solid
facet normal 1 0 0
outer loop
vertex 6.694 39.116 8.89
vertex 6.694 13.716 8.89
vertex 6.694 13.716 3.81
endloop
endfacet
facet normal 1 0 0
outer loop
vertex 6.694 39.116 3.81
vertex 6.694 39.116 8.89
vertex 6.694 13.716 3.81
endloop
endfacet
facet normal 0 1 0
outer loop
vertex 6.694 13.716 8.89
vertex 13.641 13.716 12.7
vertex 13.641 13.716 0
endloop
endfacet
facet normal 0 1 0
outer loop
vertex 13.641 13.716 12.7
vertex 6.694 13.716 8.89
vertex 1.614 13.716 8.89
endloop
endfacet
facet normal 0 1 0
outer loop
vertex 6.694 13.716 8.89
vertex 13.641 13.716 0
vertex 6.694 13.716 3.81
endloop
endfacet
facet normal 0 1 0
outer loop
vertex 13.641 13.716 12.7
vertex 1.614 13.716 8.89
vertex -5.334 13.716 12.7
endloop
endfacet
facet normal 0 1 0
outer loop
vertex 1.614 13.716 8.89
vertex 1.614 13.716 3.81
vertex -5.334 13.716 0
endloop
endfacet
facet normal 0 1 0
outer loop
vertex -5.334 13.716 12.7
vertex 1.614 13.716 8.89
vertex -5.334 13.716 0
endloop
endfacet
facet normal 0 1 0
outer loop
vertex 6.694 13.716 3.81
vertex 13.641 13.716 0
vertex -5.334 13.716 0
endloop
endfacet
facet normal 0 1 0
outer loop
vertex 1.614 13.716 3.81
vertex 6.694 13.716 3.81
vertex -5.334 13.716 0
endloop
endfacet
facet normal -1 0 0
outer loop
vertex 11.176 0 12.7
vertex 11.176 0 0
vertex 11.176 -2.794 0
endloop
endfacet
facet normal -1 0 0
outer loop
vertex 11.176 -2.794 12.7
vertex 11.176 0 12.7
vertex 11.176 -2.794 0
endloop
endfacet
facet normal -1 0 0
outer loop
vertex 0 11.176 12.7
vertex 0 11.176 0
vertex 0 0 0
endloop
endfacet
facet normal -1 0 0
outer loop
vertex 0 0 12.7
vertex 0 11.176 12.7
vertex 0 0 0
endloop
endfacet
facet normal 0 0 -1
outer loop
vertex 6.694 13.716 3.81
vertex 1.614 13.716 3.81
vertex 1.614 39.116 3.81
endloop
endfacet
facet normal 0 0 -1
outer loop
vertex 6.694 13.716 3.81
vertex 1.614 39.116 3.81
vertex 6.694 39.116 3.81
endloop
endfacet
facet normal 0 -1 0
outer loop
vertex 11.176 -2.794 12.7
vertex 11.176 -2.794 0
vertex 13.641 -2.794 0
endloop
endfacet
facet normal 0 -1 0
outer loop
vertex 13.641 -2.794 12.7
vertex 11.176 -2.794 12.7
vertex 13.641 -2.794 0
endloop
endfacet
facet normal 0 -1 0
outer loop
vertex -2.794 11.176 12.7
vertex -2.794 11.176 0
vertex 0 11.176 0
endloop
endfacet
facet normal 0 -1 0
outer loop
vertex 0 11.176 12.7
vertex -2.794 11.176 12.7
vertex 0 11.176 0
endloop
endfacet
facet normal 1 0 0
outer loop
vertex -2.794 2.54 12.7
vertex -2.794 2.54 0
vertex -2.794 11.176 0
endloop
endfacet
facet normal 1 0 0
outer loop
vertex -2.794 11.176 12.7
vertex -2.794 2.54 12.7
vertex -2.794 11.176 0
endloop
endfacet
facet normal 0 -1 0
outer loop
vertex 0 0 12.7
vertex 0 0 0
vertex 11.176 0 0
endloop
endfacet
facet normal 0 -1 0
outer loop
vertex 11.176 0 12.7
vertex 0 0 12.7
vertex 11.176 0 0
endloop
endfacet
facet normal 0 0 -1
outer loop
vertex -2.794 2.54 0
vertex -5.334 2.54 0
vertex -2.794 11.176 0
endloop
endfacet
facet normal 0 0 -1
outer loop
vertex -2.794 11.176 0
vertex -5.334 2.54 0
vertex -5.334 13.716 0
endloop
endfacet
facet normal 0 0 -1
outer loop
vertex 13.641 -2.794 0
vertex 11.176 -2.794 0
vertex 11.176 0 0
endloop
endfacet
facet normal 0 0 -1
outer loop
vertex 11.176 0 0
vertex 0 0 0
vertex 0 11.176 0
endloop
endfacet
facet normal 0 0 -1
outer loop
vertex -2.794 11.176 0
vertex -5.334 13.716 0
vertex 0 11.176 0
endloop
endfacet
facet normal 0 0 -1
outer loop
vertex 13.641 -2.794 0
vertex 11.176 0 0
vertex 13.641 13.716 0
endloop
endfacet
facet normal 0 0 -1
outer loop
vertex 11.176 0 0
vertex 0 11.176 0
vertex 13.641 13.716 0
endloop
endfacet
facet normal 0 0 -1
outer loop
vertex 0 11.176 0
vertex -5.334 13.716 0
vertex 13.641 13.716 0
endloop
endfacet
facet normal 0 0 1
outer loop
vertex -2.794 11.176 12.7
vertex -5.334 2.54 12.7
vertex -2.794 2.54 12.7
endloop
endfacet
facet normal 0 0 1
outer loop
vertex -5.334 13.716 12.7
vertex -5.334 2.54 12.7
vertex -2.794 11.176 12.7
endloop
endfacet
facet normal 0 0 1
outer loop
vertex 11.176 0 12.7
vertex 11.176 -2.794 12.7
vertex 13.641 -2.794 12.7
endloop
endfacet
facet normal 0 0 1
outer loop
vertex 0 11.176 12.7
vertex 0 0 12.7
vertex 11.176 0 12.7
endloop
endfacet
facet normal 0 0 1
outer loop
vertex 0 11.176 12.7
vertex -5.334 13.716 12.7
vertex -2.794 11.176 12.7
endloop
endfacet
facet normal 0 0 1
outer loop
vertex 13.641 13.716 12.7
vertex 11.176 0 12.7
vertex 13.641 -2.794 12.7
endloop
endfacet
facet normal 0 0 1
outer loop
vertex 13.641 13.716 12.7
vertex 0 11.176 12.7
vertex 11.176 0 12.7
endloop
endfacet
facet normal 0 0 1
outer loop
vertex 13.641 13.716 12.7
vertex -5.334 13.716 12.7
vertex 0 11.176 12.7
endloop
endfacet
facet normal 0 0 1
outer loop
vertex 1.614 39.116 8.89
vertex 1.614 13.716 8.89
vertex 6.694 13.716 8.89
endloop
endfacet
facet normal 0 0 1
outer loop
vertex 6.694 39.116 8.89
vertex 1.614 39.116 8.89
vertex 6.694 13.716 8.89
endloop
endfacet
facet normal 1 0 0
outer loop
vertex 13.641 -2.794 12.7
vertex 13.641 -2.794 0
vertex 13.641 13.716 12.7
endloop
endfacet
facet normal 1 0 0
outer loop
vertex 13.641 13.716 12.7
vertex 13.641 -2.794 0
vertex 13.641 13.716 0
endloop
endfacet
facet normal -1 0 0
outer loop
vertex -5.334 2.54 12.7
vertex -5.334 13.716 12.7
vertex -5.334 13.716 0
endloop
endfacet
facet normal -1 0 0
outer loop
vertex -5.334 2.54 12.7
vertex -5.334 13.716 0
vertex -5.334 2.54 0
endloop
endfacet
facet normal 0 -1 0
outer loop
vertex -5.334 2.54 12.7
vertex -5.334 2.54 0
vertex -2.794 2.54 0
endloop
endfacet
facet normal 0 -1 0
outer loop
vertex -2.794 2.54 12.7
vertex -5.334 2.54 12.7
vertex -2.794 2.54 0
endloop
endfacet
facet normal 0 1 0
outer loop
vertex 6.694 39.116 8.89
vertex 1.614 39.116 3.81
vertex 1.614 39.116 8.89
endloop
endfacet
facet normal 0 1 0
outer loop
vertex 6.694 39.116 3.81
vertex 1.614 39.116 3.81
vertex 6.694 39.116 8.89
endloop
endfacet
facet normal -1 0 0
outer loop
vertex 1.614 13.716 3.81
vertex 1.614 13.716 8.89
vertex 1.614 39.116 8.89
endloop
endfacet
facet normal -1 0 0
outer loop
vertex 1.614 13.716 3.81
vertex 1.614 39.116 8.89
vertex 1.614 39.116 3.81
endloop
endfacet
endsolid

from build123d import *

# Parameters (mm, degrees)
BOSS_EXTRUDE2_DEPTH = 12.7
SKETCH2_W           = 5.08
SKETCH2_H           = 5.08
BOSS_EXTRUDE3_DEPTH = 25.4


with BuildPart() as part:
    # Sketch1 → Boss-Extrude2 (new body)
    with BuildSketch(Plane.XY):
        Polygon((0, 11.176), (0, 0), (11.176, 0), (11.176, -2.794), (13.641294118, -2.794), (13.641294118, 13.716), (-5.334, 13.716), (-5.334, 2.54), (-2.794, 2.54), (-2.794, 11.176), align=None)
    extrude(amount=BOSS_EXTRUDE2_DEPTH)

    # Sketch2 → Boss-Extrude3 (add)
    with BuildSketch(Plane(origin=(0, 13.716, 0), x_dir=(1, 0, 0), z_dir=(0, 1, 0))):
        with Locations((4.153647059, -6.35)):
            Rectangle(SKETCH2_W, SKETCH2_H)
    extrude(amount=BOSS_EXTRUDE3_DEPTH)


solid = part.part
